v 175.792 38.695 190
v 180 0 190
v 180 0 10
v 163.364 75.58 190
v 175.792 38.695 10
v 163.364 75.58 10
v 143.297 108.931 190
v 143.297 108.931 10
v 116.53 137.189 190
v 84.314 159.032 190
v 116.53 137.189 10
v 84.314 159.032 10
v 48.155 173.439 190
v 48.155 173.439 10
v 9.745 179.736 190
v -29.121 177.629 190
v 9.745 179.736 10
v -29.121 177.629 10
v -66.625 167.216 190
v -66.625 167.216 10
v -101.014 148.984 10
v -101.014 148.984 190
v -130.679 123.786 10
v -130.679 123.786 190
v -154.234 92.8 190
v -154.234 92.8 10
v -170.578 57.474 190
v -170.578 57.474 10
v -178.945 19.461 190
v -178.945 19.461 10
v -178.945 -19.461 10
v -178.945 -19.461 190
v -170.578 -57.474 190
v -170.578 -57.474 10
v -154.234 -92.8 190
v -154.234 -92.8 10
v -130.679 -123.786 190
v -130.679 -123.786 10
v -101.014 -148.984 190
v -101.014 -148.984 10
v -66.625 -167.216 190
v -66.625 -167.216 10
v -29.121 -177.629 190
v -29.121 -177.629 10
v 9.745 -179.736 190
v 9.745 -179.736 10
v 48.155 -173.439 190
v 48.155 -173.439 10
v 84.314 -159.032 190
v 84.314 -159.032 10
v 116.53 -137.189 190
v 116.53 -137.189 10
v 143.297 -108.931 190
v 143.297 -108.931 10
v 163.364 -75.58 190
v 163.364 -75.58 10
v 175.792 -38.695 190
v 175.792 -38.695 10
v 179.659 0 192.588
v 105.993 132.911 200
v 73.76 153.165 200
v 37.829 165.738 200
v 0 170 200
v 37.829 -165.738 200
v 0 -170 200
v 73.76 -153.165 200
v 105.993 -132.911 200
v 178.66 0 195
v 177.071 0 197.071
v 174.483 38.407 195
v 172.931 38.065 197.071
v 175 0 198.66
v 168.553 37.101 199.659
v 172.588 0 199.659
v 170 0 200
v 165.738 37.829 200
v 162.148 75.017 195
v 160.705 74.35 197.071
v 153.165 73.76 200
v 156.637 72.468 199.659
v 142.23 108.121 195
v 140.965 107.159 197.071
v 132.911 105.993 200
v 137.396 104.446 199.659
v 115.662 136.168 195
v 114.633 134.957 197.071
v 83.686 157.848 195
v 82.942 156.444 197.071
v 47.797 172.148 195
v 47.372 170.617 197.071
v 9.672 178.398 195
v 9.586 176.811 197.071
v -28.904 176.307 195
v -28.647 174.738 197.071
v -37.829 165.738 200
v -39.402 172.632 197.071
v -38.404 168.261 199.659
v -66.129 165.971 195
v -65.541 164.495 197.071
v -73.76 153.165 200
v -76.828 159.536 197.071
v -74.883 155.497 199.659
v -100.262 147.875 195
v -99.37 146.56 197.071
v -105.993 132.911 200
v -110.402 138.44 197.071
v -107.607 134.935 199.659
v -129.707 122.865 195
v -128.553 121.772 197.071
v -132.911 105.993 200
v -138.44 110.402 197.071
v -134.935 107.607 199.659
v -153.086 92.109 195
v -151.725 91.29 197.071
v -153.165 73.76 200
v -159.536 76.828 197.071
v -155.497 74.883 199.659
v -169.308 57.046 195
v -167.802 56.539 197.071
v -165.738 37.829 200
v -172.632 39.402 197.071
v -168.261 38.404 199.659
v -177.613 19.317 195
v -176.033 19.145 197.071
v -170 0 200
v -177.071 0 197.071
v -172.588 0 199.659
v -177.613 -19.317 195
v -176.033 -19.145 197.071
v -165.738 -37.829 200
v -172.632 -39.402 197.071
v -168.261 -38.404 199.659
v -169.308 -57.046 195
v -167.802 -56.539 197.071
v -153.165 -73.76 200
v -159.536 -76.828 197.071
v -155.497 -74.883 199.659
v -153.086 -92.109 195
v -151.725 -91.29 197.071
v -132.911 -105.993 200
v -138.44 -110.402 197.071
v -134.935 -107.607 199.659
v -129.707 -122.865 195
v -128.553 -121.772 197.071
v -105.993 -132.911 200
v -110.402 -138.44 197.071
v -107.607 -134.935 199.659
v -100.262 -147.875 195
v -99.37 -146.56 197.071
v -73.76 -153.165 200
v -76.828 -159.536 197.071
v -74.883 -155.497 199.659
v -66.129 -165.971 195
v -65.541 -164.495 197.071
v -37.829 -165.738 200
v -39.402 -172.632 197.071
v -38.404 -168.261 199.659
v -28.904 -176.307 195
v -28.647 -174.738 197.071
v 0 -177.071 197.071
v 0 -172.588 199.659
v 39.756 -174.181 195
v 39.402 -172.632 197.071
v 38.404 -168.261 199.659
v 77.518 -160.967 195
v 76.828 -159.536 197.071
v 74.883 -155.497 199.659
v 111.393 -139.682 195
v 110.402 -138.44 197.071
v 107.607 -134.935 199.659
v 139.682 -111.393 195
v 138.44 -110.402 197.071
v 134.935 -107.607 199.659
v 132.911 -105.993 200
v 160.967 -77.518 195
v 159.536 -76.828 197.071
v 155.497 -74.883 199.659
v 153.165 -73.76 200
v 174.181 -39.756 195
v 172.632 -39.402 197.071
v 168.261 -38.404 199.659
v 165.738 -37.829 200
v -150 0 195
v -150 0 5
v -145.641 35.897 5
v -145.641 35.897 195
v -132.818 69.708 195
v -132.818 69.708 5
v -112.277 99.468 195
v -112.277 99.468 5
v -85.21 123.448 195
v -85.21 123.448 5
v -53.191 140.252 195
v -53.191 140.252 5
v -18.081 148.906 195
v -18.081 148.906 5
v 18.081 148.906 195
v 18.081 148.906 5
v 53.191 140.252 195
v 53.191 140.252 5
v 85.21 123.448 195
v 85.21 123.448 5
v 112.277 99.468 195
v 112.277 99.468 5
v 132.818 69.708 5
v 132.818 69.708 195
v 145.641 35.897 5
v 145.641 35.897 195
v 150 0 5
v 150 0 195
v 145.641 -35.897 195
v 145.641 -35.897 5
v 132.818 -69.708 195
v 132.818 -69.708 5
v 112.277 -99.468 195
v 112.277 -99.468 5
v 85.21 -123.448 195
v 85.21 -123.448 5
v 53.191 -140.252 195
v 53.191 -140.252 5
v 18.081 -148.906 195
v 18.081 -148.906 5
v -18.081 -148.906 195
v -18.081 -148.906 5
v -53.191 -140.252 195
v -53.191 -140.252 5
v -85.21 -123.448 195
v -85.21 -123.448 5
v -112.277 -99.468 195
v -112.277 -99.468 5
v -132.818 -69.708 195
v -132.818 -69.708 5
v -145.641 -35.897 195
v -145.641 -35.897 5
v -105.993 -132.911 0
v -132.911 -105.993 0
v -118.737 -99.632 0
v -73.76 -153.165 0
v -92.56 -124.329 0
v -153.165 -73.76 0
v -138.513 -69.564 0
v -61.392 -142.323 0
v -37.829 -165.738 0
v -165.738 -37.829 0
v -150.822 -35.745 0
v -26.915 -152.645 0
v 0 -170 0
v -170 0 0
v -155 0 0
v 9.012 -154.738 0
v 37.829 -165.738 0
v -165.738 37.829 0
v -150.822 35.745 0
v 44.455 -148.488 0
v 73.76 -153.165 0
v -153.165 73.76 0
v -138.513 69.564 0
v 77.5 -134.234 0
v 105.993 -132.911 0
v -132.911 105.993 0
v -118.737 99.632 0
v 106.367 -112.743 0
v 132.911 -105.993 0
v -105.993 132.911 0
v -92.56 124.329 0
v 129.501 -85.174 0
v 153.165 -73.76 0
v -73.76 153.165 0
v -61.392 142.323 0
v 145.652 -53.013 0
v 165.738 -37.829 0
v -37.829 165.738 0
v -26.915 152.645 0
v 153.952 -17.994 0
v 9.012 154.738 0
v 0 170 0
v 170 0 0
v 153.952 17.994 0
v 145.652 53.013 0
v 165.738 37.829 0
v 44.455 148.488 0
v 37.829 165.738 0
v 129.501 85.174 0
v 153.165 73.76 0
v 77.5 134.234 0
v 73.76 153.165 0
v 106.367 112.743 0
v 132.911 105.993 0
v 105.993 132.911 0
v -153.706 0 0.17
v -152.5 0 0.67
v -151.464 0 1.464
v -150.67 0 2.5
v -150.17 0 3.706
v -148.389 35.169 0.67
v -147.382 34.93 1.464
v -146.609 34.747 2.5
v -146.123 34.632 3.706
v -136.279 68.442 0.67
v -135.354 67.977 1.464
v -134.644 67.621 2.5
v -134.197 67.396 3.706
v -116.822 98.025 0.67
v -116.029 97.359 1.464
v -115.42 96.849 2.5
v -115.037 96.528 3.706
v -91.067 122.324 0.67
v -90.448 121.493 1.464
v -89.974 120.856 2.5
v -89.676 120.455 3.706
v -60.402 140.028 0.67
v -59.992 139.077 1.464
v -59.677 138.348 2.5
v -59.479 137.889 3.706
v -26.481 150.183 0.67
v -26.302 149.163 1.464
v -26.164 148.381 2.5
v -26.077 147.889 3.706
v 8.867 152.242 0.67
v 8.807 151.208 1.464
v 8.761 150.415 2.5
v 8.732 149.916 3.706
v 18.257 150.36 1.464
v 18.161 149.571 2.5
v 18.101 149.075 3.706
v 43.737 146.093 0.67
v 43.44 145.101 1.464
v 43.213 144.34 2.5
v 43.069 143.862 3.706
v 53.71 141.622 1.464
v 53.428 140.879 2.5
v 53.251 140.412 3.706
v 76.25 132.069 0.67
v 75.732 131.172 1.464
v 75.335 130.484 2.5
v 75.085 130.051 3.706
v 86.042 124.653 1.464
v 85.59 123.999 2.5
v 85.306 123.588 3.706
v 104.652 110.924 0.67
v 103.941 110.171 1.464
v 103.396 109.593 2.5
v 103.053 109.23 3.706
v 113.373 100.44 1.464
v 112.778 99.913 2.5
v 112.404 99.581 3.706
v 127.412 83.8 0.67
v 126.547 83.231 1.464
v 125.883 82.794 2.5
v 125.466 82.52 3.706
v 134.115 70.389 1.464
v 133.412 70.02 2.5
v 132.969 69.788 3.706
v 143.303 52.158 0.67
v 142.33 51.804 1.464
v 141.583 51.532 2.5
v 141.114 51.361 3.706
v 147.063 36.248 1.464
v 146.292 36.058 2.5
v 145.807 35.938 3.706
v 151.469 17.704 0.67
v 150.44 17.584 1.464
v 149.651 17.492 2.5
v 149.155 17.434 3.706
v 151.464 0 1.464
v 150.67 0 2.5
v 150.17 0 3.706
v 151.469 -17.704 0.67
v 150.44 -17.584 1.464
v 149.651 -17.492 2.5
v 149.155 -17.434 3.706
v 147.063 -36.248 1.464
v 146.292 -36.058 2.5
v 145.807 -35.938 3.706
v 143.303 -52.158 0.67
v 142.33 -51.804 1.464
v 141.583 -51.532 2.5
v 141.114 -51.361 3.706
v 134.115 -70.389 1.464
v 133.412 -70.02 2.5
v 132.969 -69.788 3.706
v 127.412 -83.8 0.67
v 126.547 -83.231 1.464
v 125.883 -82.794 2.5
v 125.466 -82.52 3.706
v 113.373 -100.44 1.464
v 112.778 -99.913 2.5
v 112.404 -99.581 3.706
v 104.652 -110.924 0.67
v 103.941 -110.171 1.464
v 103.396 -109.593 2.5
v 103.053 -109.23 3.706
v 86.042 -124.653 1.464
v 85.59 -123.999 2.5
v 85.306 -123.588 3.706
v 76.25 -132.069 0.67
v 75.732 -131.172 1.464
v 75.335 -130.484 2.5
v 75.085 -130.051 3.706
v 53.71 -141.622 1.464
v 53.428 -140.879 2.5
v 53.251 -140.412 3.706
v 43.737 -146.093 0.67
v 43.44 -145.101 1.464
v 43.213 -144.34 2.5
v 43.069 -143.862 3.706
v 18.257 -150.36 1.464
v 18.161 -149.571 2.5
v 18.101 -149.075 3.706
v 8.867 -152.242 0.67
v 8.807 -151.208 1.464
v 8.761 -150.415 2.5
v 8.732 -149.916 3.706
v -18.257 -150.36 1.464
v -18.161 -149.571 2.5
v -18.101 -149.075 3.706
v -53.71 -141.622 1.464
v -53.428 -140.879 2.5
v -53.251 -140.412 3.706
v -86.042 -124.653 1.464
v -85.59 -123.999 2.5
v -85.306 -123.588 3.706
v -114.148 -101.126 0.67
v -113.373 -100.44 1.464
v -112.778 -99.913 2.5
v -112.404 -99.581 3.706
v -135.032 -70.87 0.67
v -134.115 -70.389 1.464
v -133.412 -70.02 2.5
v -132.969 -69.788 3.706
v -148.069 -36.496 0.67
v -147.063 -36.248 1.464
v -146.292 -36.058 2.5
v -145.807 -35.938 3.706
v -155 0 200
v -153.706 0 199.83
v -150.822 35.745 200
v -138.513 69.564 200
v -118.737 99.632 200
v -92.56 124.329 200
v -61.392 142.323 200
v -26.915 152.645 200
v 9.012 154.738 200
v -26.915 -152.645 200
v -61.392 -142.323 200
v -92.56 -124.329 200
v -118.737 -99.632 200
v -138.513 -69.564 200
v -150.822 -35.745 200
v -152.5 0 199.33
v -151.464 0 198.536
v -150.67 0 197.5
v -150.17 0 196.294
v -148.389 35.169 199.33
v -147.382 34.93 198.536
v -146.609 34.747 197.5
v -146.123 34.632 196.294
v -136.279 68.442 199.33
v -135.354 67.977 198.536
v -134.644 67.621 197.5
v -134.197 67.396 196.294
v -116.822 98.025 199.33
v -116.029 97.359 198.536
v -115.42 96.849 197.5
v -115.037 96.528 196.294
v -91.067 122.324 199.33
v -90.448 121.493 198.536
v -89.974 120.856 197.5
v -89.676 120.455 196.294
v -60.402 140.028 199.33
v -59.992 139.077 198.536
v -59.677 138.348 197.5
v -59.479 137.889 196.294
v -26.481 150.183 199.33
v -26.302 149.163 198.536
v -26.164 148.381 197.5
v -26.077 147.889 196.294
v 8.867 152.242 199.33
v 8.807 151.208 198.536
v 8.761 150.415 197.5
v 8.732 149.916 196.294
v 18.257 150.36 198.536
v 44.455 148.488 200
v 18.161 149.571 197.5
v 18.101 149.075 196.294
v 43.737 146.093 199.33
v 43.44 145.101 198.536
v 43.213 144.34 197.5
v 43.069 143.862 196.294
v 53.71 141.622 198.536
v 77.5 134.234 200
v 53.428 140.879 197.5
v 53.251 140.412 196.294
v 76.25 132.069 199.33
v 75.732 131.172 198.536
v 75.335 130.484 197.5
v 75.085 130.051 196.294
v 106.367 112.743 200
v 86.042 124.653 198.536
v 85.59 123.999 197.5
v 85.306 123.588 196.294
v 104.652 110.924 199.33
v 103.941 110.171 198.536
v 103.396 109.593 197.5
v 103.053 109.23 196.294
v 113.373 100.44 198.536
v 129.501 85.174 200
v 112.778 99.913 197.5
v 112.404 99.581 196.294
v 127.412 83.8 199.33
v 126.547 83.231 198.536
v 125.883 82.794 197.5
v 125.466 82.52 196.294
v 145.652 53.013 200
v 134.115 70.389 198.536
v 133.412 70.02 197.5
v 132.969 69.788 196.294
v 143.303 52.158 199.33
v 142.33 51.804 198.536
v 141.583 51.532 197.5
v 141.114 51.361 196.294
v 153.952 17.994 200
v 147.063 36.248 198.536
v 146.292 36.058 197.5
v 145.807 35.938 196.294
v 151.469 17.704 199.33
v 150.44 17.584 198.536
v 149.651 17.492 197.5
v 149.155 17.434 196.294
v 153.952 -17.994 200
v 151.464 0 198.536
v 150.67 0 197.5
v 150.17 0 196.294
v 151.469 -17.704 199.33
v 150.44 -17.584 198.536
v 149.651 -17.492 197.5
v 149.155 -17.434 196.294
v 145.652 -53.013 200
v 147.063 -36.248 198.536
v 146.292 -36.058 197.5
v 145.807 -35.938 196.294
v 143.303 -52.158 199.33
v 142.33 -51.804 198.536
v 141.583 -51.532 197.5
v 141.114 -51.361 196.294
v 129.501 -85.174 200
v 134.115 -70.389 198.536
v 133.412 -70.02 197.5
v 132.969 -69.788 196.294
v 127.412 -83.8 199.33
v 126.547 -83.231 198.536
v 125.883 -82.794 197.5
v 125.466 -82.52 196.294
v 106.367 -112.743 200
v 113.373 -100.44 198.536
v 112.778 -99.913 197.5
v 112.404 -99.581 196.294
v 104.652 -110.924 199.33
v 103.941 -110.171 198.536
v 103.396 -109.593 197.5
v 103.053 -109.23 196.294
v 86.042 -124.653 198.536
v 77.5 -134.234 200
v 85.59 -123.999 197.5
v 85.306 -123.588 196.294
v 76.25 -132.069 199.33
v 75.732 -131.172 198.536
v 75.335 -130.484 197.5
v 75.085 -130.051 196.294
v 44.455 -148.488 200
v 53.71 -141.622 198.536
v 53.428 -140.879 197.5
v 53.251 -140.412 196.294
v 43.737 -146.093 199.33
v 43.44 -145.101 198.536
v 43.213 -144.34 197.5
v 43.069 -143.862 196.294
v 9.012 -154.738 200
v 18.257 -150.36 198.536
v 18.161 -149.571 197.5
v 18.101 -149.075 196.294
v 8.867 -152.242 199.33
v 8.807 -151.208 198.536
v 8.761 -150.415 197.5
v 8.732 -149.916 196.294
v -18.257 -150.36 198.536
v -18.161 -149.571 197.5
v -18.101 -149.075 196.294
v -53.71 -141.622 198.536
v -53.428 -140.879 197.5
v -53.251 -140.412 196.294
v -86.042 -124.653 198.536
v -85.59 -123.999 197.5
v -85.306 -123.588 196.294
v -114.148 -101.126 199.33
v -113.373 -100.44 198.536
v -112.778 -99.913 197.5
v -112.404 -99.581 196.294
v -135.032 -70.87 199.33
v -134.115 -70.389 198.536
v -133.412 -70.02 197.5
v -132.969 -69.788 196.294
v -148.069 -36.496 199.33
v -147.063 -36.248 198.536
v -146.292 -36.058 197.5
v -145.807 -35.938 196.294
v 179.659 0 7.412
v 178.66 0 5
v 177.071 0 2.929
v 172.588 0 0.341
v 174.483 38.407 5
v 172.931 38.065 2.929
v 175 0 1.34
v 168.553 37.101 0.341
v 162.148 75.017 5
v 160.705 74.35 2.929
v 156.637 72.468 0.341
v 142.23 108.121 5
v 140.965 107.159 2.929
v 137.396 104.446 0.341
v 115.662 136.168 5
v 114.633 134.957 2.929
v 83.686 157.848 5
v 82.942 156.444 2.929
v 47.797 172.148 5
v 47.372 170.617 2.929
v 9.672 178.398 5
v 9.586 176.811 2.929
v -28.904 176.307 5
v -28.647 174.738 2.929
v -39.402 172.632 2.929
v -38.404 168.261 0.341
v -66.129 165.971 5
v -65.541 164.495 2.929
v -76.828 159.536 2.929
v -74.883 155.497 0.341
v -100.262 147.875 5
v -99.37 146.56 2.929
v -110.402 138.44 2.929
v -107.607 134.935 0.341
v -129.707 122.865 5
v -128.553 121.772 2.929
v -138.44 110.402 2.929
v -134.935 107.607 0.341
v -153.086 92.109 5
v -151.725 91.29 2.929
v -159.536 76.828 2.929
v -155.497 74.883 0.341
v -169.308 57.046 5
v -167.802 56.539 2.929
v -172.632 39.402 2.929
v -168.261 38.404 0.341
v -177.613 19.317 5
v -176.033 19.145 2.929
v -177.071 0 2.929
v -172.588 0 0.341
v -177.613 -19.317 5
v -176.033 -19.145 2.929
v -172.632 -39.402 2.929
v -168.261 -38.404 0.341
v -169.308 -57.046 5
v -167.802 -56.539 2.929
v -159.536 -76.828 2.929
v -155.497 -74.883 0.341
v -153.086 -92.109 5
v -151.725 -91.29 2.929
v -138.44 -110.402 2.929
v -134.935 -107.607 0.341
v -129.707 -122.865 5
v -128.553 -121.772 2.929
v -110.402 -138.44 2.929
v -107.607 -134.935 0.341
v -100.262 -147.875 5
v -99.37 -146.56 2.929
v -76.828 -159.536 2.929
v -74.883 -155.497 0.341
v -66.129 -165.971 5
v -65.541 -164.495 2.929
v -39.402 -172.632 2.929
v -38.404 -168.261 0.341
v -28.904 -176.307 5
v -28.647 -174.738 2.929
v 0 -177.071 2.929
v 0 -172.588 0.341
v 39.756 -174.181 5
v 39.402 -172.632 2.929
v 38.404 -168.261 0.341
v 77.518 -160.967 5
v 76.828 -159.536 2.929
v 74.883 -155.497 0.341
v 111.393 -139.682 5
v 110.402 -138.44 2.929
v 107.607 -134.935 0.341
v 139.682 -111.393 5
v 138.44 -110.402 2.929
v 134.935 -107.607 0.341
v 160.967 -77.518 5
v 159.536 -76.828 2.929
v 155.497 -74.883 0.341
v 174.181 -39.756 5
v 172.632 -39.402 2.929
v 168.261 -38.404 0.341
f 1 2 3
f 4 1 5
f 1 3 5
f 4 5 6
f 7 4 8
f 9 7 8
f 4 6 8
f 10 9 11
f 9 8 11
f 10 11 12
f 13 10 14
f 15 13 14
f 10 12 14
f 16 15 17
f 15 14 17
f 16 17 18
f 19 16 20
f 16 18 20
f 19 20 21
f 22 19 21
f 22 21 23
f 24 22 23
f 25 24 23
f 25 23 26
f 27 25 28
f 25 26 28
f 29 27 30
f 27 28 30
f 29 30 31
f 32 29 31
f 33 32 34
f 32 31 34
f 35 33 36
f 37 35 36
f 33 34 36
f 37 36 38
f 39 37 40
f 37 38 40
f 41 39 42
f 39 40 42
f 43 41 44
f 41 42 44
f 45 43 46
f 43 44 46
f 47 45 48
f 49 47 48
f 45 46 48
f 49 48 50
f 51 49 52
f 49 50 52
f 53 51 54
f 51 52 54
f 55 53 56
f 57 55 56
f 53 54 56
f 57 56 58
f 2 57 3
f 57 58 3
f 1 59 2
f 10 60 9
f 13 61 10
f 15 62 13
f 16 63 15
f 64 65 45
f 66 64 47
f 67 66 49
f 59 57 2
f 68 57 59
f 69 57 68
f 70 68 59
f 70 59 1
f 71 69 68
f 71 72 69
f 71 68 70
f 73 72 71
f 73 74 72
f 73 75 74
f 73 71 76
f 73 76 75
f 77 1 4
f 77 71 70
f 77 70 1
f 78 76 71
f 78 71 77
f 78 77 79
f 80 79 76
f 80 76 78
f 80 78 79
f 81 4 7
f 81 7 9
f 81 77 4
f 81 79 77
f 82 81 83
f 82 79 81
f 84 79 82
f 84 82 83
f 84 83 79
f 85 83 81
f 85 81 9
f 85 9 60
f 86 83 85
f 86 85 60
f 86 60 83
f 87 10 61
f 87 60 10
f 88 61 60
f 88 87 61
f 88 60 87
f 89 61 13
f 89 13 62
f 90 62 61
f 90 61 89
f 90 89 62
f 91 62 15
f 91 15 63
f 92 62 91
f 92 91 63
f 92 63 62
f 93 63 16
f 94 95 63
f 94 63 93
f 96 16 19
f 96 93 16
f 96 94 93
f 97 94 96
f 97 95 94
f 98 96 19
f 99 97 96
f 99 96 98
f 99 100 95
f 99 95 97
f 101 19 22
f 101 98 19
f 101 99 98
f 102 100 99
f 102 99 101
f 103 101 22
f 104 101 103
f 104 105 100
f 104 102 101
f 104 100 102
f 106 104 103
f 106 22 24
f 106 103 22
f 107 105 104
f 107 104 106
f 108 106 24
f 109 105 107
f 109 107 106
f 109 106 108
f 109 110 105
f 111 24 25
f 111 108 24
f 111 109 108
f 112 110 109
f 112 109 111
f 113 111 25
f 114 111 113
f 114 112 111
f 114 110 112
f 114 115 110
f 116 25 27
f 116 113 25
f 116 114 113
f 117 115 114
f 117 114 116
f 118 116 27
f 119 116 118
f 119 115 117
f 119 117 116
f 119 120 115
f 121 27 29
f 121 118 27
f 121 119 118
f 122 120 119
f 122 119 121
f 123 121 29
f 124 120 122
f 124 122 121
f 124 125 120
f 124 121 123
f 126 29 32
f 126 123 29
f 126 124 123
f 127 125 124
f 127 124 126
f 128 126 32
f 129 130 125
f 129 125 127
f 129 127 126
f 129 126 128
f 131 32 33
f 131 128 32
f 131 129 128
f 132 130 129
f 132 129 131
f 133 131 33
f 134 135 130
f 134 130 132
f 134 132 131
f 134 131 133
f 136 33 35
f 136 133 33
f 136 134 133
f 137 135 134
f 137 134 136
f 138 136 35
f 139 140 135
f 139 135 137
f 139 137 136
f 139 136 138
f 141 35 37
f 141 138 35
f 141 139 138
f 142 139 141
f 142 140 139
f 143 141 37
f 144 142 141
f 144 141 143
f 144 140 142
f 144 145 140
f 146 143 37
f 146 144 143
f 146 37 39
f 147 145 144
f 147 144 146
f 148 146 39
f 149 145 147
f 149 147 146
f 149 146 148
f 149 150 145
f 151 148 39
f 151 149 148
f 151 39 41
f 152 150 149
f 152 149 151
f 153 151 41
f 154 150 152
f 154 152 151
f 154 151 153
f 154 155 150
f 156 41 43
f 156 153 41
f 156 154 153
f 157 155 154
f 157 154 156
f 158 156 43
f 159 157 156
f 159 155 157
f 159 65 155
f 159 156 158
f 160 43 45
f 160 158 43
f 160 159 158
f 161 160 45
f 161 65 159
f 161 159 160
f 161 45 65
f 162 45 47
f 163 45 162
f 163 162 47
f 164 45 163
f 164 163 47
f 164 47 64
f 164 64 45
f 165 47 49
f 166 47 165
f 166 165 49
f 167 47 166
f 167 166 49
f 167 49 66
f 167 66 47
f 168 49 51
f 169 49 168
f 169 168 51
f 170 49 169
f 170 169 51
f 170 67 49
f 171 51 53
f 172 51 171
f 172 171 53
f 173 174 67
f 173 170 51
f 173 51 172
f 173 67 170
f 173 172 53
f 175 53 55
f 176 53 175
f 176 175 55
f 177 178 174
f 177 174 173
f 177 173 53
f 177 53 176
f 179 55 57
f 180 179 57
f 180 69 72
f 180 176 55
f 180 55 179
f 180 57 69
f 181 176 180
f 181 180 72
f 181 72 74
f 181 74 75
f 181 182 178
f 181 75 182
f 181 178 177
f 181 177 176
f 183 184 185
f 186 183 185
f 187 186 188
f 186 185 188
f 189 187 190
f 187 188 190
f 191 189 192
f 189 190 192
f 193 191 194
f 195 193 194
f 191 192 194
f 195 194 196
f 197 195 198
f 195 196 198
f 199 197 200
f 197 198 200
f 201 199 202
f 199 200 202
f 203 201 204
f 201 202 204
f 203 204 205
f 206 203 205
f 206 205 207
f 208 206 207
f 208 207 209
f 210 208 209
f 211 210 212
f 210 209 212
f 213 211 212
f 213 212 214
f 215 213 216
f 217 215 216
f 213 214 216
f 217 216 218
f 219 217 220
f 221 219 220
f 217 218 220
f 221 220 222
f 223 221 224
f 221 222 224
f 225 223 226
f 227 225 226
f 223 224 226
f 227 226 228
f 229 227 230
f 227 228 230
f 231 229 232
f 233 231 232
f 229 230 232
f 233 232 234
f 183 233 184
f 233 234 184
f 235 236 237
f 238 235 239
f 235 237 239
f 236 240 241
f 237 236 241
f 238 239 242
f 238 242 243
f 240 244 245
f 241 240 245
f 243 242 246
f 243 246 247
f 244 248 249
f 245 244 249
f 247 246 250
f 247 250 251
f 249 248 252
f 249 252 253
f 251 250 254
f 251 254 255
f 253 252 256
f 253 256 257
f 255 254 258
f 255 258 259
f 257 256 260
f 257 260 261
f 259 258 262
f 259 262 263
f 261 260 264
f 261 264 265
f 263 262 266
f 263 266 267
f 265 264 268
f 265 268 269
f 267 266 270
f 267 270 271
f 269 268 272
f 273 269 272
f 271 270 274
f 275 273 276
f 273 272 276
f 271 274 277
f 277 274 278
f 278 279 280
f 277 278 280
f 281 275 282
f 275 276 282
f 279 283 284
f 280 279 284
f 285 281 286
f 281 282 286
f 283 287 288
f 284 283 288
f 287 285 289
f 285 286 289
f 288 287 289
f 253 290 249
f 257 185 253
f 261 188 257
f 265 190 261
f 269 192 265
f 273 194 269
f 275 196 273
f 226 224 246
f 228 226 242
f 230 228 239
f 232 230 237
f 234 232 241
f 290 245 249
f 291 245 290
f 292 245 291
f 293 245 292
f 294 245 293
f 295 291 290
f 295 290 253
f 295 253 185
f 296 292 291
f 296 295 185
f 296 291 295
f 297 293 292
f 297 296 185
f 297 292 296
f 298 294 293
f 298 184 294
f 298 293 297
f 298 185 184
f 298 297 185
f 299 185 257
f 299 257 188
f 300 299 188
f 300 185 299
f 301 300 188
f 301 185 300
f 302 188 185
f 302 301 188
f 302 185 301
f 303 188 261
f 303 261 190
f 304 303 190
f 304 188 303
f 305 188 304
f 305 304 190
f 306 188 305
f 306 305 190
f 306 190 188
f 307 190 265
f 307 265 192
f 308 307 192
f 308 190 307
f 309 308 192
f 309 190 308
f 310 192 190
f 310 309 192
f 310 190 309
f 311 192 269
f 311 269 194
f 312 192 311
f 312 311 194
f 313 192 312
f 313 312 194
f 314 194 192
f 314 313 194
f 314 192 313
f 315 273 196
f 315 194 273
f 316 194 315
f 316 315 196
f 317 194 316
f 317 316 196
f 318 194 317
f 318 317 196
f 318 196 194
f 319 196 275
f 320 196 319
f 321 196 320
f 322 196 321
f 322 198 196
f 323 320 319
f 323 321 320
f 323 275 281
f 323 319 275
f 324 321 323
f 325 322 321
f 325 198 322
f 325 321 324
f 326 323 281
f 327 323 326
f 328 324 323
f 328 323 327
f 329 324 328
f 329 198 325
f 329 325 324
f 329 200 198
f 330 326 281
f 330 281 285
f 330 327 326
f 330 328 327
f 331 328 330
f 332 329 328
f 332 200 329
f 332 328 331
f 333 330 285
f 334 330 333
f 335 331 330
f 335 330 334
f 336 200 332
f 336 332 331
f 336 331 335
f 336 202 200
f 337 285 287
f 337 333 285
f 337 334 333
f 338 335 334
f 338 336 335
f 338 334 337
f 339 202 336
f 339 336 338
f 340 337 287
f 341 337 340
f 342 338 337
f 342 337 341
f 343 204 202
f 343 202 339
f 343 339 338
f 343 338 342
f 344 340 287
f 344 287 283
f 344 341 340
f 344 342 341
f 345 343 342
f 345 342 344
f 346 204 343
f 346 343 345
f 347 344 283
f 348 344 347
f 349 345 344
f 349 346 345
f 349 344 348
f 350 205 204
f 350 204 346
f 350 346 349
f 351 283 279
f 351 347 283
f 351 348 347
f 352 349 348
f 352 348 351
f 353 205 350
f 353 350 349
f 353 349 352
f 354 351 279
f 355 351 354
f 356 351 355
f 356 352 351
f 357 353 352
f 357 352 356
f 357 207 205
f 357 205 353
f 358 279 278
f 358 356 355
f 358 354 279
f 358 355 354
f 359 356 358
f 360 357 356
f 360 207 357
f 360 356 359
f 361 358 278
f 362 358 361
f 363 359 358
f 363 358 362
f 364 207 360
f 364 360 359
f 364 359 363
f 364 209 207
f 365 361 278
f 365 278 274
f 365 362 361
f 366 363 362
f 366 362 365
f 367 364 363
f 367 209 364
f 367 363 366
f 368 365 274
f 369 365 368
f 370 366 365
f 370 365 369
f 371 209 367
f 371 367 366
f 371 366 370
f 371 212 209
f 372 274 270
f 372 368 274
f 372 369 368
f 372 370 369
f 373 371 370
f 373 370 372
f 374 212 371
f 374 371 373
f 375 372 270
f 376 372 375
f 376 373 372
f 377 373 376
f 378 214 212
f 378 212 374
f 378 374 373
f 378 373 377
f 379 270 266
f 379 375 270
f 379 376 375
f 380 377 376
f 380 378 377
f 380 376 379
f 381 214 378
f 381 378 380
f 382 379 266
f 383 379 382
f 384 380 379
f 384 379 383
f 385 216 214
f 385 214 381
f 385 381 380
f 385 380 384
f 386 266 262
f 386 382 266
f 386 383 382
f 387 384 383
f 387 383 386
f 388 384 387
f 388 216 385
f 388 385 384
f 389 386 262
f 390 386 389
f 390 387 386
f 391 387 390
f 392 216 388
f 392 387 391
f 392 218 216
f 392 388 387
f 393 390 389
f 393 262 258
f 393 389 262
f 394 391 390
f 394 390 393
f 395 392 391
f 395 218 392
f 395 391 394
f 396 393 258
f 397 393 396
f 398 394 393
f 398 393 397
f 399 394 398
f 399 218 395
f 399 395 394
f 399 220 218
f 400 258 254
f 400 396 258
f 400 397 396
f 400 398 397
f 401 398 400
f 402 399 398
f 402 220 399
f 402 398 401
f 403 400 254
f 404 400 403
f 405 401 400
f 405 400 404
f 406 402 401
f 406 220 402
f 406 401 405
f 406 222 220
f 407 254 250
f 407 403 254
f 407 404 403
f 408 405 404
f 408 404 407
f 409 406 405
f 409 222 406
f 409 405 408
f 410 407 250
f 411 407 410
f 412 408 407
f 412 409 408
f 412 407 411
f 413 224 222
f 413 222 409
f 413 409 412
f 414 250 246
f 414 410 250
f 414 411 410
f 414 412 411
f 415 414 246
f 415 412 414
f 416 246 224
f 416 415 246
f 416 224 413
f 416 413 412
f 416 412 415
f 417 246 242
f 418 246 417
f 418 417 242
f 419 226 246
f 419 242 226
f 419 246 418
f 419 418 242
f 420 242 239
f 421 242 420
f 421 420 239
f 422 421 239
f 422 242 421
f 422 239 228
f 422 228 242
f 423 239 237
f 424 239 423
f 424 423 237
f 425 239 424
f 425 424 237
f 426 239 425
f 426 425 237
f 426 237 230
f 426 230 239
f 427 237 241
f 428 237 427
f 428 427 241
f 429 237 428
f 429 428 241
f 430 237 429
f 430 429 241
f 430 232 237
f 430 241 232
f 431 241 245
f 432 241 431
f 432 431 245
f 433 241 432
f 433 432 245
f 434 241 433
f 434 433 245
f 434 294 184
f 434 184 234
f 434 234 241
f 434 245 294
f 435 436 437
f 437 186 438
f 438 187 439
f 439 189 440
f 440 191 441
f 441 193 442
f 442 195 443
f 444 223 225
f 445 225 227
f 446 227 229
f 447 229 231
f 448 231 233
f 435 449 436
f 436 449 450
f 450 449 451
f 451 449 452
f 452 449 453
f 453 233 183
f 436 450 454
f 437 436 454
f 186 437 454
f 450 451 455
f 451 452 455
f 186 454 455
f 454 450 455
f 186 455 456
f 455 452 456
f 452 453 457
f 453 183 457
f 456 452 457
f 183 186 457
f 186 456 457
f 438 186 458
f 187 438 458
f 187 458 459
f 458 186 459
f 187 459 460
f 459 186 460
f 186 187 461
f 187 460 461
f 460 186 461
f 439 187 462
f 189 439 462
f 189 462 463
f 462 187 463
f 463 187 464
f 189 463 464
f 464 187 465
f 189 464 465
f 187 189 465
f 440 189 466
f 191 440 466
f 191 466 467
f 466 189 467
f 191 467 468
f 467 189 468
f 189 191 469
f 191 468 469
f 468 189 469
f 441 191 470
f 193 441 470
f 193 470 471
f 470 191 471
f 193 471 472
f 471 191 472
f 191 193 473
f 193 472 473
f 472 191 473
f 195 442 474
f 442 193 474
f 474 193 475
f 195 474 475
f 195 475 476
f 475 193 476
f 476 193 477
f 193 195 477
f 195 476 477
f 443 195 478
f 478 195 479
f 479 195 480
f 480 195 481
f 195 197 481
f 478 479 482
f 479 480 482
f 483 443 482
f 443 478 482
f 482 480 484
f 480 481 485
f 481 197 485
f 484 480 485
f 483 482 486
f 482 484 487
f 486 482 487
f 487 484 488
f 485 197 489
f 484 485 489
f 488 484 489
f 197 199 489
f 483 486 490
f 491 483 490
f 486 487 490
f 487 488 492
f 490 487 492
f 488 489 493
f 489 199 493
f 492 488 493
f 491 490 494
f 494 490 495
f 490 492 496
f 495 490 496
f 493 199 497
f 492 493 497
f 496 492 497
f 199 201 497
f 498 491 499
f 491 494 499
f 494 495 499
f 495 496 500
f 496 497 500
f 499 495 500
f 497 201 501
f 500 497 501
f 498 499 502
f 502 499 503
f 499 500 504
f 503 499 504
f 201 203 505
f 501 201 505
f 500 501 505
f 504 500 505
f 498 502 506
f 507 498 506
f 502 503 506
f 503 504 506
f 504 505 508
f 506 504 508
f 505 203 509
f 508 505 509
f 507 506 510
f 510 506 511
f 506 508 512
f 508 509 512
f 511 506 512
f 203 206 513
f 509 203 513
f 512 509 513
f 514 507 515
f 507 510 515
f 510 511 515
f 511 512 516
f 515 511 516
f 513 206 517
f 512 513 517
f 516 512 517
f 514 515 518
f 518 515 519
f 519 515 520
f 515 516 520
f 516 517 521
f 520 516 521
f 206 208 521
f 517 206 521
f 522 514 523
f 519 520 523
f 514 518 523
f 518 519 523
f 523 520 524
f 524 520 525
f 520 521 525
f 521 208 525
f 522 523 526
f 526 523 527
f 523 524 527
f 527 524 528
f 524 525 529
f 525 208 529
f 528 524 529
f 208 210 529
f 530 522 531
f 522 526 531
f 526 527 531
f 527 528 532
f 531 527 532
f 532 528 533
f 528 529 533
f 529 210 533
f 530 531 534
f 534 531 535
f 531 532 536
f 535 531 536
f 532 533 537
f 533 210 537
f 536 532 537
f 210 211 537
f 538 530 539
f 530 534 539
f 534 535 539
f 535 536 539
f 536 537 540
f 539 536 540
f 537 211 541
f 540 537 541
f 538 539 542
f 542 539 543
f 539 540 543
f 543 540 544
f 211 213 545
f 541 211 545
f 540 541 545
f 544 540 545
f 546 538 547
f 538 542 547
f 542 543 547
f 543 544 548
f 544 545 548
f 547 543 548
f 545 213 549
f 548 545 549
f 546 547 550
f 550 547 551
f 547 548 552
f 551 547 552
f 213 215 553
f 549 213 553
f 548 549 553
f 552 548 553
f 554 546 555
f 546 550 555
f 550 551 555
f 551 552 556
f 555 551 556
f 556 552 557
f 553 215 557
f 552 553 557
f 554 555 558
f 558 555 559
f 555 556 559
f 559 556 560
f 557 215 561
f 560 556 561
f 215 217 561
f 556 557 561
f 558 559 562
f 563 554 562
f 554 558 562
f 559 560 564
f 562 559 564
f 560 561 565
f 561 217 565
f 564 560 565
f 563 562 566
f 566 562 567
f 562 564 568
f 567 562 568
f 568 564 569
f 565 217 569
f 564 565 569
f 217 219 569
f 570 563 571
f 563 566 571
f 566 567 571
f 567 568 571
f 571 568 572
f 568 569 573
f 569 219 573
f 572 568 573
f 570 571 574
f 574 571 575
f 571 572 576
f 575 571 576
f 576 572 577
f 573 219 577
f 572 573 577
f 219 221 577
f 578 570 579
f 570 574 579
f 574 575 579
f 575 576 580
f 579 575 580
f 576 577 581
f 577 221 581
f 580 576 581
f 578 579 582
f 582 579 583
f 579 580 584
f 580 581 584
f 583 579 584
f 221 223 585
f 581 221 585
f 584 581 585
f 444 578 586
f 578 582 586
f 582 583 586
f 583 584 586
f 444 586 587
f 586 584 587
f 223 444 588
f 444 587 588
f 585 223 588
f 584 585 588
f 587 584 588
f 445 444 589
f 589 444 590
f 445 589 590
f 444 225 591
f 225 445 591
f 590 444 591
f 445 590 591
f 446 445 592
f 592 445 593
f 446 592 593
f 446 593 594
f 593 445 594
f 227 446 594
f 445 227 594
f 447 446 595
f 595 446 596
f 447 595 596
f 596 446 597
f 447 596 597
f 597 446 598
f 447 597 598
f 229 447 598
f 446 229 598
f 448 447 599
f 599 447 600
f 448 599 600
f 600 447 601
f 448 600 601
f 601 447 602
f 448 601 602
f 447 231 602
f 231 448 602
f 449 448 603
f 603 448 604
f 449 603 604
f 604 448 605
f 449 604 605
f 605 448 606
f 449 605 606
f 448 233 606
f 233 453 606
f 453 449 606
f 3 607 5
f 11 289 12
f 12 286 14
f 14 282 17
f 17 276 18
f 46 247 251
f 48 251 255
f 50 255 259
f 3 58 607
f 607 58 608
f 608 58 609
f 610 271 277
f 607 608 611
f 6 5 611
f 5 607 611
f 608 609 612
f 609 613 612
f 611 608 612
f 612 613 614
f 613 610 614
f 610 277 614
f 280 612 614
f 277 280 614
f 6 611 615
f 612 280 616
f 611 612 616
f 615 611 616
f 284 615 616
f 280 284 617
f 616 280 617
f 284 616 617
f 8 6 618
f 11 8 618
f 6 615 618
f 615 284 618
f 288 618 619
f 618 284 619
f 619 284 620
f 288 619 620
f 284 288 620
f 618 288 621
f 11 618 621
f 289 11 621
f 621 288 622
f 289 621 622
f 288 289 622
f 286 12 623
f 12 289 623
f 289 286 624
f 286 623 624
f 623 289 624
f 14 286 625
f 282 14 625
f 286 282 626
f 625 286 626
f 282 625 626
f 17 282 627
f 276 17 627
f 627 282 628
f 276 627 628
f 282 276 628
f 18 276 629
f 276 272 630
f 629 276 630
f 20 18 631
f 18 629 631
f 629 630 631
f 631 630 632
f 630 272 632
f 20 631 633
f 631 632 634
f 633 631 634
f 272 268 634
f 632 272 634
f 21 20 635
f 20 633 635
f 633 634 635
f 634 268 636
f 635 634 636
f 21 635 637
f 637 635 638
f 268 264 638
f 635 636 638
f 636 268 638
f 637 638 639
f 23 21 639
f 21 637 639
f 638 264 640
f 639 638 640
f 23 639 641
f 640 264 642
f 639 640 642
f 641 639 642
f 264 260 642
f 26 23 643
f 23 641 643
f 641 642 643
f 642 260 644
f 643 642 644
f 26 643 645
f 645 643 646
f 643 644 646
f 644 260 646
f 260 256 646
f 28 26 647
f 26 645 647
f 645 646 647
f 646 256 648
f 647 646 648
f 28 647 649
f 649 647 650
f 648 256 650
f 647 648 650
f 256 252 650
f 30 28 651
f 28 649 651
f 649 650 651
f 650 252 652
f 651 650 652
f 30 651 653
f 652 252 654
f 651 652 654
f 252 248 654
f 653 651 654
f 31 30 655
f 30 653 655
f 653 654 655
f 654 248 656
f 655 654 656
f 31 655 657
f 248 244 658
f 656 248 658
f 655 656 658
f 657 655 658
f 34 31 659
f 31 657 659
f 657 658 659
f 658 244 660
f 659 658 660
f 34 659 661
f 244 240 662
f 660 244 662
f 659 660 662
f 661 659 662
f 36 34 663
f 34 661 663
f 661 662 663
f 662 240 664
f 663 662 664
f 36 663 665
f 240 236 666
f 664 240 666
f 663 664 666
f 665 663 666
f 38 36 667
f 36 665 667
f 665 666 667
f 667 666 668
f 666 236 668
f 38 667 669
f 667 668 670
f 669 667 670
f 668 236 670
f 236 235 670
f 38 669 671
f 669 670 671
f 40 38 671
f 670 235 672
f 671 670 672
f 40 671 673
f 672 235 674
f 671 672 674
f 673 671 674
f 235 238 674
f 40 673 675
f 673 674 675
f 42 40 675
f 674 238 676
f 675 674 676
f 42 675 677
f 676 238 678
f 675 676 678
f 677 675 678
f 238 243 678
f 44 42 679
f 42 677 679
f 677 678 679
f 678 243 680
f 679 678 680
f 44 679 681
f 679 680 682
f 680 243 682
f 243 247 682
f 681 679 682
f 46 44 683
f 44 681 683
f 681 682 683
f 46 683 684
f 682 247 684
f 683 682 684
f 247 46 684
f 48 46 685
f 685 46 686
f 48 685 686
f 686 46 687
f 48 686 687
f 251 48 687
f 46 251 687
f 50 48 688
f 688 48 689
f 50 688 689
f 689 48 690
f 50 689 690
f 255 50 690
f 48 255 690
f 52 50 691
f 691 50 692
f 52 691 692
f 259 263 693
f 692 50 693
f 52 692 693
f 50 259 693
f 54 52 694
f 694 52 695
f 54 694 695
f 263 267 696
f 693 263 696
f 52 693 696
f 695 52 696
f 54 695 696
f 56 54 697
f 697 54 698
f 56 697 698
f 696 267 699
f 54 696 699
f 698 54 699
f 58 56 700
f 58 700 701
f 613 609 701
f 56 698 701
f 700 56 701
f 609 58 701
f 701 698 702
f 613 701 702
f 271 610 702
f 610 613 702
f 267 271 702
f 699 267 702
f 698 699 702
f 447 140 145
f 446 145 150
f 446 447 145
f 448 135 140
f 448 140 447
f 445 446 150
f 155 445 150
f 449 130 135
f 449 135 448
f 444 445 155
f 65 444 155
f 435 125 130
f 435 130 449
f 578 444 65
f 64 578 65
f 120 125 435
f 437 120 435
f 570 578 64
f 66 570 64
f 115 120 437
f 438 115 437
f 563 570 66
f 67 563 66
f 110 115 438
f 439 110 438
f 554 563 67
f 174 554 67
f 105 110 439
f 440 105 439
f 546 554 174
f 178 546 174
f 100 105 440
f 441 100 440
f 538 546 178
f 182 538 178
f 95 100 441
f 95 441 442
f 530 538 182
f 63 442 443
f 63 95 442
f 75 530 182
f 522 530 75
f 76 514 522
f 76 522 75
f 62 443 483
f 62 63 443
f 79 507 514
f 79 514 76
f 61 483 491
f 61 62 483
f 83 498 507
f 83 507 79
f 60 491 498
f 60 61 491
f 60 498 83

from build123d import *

# Parameters (mm, degrees)
IZIM1_R                     = 180
Y_KSEKLIK_EKSTR_ZYON1_DEPTH = 200
RADYUS2_R                   = 10
IZIM2_R                     = 150
KES_EKSTR_ZYON1_DEPTH       = 200
RADYUS3_R                   = 5


with BuildPart() as part:
    # Çizim1 → Yükseklik-Ekstrüzyon1 (new body)
    with BuildSketch(Plane.XY):
        Circle(IZIM1_R)
    extrude(amount=Y_KSEKLIK_EKSTR_ZYON1_DEPTH)

    # Radyus2
    radyus2_edges = [part.edges().sort_by_distance(p)[0] for p in [
        (-180, 0, 0),
        (-180, 0, 200),
    ]]
    fillet(radyus2_edges, radius=RADYUS2_R)

    # Çizim2 → Kes-Ekstrüzyon1 (cut)
    with BuildSketch(Plane(origin=(0, 0, 0), x_dir=(-1, 0, 0), z_dir=(0, 0, -1))):
        Circle(IZIM2_R)
    extrude(amount=-KES_EKSTR_ZYON1_DEPTH, mode=Mode.SUBTRACT)

    # Radyus3
    radyus3_edges = [part.edges().sort_by_distance(p)[0] for p in [
        (150, 0, 200),
        (150, 0, 0),
    ]]
    fillet(radyus3_edges, radius=RADYUS3_R)


solid = part.part
